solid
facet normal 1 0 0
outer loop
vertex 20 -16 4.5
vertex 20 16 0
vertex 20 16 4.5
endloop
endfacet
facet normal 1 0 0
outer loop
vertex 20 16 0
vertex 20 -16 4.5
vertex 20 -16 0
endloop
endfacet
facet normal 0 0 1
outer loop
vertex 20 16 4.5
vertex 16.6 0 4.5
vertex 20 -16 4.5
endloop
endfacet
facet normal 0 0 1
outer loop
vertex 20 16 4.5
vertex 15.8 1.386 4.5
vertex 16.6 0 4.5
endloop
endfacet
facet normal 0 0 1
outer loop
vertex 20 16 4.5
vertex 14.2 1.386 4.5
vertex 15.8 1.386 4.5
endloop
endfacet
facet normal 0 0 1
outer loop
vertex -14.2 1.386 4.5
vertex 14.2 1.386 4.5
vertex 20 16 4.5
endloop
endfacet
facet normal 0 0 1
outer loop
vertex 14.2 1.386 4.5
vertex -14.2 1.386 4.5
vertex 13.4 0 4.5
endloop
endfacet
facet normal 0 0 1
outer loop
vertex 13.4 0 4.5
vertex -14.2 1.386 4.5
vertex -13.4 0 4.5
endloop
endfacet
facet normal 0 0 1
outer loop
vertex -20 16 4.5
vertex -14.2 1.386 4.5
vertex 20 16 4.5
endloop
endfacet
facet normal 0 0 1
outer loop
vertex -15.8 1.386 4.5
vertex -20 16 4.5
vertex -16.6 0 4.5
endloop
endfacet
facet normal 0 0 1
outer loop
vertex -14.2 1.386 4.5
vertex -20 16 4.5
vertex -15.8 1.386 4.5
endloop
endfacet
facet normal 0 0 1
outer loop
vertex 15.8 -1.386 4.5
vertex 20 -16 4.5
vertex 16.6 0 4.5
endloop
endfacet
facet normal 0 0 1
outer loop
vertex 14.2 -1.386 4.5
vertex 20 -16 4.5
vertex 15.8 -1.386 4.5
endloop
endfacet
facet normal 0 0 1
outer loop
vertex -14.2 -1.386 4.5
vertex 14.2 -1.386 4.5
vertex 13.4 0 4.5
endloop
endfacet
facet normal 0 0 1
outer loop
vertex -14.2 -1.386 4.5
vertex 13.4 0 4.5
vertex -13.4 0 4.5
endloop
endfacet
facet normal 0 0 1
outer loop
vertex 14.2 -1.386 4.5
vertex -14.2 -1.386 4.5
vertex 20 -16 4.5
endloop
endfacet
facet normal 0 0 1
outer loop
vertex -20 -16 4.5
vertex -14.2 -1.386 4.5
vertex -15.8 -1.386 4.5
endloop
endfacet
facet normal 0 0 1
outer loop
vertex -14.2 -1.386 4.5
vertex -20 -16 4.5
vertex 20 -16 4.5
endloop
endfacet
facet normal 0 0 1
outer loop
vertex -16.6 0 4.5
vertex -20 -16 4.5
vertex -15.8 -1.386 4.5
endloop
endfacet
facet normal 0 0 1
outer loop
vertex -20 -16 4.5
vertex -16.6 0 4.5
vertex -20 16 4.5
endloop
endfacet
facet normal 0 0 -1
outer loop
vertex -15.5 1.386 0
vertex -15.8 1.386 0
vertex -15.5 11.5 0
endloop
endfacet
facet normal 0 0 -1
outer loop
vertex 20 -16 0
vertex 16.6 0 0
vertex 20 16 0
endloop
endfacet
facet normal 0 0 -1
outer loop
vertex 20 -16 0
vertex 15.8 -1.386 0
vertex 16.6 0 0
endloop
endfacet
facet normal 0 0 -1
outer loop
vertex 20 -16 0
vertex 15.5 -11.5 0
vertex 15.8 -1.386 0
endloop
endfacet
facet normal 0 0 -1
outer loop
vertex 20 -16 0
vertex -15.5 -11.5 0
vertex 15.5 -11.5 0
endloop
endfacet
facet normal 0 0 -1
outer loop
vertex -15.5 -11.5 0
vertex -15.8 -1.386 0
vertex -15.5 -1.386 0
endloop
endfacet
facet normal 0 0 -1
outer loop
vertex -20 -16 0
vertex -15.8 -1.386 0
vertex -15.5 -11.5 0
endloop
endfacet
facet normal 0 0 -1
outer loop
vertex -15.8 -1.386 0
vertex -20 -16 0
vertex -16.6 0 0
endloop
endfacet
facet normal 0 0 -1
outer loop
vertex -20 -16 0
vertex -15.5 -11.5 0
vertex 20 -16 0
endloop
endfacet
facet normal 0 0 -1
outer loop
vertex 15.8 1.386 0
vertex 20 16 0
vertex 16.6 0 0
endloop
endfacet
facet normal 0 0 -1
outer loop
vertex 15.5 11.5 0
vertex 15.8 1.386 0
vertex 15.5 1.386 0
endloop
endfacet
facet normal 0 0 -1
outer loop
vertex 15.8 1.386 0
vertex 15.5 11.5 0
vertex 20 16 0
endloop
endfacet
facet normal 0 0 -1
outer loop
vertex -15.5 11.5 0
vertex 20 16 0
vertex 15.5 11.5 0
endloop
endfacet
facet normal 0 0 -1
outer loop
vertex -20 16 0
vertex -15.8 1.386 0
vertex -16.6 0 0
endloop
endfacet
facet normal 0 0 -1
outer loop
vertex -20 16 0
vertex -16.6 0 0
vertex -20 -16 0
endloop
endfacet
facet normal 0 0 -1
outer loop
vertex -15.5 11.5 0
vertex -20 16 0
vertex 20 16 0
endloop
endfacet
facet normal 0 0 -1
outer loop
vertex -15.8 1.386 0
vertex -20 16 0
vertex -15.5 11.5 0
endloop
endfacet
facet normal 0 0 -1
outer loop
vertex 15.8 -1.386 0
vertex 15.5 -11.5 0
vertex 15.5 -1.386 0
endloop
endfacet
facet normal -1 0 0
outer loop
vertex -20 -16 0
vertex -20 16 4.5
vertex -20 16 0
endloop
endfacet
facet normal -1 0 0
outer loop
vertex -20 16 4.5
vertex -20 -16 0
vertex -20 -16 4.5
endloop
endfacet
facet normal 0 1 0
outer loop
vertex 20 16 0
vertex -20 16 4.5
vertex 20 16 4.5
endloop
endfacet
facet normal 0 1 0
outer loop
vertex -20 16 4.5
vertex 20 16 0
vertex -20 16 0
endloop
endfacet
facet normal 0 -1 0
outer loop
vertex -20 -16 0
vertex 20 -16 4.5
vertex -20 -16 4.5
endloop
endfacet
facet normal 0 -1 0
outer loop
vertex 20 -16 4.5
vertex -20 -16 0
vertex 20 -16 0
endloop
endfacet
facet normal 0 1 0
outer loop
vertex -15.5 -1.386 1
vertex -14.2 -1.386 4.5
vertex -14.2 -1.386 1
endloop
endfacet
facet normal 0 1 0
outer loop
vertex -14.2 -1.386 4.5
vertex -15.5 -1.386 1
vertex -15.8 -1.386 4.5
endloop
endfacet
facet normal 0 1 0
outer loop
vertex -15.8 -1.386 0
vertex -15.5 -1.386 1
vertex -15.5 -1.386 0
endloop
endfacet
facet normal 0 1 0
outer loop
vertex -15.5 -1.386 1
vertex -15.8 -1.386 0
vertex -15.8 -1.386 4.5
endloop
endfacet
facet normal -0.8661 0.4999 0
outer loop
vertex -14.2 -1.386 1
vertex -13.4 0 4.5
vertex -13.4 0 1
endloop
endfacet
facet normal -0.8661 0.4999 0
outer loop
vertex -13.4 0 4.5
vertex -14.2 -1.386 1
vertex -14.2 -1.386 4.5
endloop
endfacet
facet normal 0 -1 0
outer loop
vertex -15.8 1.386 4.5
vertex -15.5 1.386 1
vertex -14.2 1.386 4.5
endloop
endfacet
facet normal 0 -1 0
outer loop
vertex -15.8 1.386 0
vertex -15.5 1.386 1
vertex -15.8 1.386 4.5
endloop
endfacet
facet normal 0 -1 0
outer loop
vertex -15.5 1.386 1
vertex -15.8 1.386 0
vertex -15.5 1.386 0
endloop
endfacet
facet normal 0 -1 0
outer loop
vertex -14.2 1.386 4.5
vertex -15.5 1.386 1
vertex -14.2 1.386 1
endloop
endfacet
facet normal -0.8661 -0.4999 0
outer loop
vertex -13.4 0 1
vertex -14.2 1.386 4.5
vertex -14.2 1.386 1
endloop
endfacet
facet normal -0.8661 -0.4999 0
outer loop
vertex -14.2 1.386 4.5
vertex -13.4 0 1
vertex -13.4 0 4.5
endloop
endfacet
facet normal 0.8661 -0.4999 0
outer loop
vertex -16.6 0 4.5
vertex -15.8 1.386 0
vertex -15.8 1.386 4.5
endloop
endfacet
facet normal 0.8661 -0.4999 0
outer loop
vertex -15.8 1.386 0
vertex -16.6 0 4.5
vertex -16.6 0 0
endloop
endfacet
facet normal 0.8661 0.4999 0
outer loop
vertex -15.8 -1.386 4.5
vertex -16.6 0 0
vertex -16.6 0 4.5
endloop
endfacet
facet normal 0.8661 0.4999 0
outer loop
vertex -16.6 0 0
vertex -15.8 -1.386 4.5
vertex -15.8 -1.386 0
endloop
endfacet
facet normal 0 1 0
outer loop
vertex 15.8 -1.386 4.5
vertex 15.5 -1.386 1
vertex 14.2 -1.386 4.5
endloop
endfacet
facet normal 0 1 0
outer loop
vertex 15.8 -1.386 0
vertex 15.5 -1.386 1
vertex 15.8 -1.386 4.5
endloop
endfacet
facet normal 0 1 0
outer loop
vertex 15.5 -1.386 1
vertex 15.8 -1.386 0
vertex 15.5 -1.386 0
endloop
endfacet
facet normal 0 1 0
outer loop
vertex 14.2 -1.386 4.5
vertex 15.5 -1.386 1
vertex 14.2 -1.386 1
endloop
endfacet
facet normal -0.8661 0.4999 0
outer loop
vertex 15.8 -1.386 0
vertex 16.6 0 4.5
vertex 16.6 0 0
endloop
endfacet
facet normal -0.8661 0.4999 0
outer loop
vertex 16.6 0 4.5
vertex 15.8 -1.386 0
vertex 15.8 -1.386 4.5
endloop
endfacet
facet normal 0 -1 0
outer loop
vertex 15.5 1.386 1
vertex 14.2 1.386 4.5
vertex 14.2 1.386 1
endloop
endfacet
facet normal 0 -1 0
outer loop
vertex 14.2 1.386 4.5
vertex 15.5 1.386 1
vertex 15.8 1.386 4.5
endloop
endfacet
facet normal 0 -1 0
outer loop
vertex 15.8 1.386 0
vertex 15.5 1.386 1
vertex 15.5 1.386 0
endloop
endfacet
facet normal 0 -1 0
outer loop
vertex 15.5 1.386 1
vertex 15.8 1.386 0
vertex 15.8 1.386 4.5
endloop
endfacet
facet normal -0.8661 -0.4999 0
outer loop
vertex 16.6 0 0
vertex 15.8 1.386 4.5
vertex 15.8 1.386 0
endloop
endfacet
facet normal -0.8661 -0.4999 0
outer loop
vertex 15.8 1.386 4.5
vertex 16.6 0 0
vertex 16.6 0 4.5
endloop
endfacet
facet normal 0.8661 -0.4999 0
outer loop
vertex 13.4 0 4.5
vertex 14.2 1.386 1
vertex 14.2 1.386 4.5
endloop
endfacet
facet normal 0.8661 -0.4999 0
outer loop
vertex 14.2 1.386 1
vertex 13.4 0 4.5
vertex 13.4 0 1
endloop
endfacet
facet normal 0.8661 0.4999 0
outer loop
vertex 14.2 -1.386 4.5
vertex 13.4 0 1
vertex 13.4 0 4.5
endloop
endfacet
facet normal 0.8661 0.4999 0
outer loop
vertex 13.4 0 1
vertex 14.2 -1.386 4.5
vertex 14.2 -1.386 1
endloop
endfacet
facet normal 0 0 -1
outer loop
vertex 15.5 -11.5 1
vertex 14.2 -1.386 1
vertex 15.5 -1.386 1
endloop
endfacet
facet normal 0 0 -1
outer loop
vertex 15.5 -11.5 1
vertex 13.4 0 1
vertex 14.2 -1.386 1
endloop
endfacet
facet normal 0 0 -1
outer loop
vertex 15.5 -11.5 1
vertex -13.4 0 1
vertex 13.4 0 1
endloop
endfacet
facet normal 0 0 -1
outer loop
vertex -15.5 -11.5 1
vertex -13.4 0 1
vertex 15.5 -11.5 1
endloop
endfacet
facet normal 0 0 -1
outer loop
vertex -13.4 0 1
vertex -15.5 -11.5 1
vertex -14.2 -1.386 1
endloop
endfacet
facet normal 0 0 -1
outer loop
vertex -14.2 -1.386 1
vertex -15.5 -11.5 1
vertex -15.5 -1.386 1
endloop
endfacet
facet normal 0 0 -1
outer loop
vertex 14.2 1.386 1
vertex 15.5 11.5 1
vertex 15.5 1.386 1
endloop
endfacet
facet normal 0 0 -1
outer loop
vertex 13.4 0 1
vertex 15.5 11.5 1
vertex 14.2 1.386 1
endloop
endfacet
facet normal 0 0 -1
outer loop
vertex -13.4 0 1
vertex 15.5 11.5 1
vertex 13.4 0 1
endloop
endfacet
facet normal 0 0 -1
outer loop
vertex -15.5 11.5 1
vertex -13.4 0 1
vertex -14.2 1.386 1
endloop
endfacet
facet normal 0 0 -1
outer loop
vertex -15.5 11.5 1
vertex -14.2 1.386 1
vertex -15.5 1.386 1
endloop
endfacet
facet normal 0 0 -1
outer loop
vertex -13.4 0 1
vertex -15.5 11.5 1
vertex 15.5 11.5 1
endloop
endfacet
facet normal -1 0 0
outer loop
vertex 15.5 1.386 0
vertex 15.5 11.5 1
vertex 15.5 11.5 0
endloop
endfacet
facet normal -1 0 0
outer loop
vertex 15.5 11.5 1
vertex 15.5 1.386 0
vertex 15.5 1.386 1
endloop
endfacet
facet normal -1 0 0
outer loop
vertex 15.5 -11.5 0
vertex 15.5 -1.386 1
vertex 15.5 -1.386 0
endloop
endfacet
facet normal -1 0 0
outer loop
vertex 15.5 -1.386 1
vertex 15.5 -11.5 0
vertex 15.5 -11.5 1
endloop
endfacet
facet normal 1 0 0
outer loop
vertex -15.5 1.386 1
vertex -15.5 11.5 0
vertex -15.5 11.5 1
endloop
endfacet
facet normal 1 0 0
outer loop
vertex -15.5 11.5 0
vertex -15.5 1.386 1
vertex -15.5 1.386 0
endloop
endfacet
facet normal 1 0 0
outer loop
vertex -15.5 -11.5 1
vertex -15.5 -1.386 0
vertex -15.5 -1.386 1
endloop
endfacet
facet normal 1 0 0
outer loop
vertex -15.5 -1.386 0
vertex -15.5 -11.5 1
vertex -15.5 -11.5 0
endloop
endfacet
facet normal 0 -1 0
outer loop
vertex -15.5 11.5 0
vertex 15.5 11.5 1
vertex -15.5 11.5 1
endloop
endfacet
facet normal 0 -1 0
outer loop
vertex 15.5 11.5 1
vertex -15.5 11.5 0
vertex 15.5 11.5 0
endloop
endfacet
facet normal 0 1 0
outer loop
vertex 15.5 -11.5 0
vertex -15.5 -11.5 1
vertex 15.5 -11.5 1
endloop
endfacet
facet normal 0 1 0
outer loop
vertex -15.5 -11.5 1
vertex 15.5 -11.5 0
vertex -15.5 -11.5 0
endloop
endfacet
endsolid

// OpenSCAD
// Parameters
overall_width_mm = 40; //[20:80:0.5]
overall_height_mm = 32; //[16:64:0.5]
flange_thickness_mm = 2.5; //[1.2:5:0.1]
bezel_thickness_mm = 2; //[1:4:0.1]
corner_radius_mm = 2.5; //[0.5:6:0.1]
body_depth_mm = 28; //[14:56:0.5]
body_width_mm = 30; //[15:60:0.5]
body_height_mm = 22; //[11:44:0.5]
cutout_width_mm = 30; //[15:60:0.5]
cutout_height_mm = 22; //[11:44:0.5]
mount_hole_diameter_mm = 3.2; //[2:6.5:0.1]
mount_hole_pitch_x_mm = 30; //[15:60:0.5]
mount_hole_pitch_y_mm = 0; //[0:20:0.5]
mount_hole_offset_from_edges_mm = 5; //[2:12:0.5]
panel_thickness_mm = 2; //[0.8:6:0.1]
rear_body_clearance_extra_mm = 0.5; //[0.2:2:0.1]
terminal_clearance_width_mm = 26; //[13:52:0.5]
terminal_clearance_height_mm = 18; //[9:36:0.5]
terminal_clearance_depth_mm = 14; //[7:28:0.5]
overlap_mm = 1; //[0.5:2:0.1]

// IEC Connector - complete geometry
module iec() {
  color("Black") {
    // Front Flange Bezel
    translate([0, 0, (flange_thickness_mm + bezel_thickness_mm) / 2])
      cube([overall_width_mm, overall_height_mm, flange_thickness_mm + bezel_thickness_mm], center=true);
    
    // IEC Connector Body
    translate([0, 0, -body_depth_mm / 2 + overlap_mm])
      cube([body_width_mm, body_height_mm, body_depth_mm], center=true);
  }
}

// Mod - complete geometry
module mod() {
  color("DimGray") {
    // Mounting Screw Holes
    union() {
      translate([-mount_hole_pitch_x_mm / 2, -mount_hole_pitch_y_mm / 2, (flange_thickness_mm + bezel_thickness_mm) / 2])
        cylinder(r=mount_hole_diameter_mm / 2, h=flange_thickness_mm + bezel_thickness_mm + 2 * overlap_mm, center=true);
      translate([mount_hole_pitch_x_mm / 2, mount_hole_pitch_y_mm / 2, (flange_thickness_mm + bezel_thickness_mm) / 2])
        cylinder(r=mount_hole_diameter_mm / 2, h=flange_thickness_mm + bezel_thickness_mm + 2 * overlap_mm, center=true);
    }
    
    // Panel Cutout Profile
    translate([0, 0, -panel_thickness_mm / 2])
      cube([cutout_width_mm, cutout_height_mm, panel_thickness_mm + 2 * overlap_mm], center=true);
    
    // Rear Body Clearance Volume
    translate([0, 0, -(body_depth_mm + 2 * rear_body_clearance_extra_mm) / 2 + overlap_mm])
      cube([body_width_mm + 2 * rear_body_clearance_extra_mm, body_height_mm + 2 * rear_body_clearance_extra_mm, body_depth_mm + 2 * rear_body_clearance_extra_mm], center=true);
    
    // Terminal Spade Clearance Zone
    translate([0, 0, -body_depth_mm + overlap_mm - terminal_clearance_depth_mm / 2])
      cube([terminal_clearance_width_mm, terminal_clearance_height_mm, terminal_clearance_depth_mm], center=true);
  }
}

// Assembly
module assembly() {
  difference() {
    iec();
    mod();
  }
}

assembly();
